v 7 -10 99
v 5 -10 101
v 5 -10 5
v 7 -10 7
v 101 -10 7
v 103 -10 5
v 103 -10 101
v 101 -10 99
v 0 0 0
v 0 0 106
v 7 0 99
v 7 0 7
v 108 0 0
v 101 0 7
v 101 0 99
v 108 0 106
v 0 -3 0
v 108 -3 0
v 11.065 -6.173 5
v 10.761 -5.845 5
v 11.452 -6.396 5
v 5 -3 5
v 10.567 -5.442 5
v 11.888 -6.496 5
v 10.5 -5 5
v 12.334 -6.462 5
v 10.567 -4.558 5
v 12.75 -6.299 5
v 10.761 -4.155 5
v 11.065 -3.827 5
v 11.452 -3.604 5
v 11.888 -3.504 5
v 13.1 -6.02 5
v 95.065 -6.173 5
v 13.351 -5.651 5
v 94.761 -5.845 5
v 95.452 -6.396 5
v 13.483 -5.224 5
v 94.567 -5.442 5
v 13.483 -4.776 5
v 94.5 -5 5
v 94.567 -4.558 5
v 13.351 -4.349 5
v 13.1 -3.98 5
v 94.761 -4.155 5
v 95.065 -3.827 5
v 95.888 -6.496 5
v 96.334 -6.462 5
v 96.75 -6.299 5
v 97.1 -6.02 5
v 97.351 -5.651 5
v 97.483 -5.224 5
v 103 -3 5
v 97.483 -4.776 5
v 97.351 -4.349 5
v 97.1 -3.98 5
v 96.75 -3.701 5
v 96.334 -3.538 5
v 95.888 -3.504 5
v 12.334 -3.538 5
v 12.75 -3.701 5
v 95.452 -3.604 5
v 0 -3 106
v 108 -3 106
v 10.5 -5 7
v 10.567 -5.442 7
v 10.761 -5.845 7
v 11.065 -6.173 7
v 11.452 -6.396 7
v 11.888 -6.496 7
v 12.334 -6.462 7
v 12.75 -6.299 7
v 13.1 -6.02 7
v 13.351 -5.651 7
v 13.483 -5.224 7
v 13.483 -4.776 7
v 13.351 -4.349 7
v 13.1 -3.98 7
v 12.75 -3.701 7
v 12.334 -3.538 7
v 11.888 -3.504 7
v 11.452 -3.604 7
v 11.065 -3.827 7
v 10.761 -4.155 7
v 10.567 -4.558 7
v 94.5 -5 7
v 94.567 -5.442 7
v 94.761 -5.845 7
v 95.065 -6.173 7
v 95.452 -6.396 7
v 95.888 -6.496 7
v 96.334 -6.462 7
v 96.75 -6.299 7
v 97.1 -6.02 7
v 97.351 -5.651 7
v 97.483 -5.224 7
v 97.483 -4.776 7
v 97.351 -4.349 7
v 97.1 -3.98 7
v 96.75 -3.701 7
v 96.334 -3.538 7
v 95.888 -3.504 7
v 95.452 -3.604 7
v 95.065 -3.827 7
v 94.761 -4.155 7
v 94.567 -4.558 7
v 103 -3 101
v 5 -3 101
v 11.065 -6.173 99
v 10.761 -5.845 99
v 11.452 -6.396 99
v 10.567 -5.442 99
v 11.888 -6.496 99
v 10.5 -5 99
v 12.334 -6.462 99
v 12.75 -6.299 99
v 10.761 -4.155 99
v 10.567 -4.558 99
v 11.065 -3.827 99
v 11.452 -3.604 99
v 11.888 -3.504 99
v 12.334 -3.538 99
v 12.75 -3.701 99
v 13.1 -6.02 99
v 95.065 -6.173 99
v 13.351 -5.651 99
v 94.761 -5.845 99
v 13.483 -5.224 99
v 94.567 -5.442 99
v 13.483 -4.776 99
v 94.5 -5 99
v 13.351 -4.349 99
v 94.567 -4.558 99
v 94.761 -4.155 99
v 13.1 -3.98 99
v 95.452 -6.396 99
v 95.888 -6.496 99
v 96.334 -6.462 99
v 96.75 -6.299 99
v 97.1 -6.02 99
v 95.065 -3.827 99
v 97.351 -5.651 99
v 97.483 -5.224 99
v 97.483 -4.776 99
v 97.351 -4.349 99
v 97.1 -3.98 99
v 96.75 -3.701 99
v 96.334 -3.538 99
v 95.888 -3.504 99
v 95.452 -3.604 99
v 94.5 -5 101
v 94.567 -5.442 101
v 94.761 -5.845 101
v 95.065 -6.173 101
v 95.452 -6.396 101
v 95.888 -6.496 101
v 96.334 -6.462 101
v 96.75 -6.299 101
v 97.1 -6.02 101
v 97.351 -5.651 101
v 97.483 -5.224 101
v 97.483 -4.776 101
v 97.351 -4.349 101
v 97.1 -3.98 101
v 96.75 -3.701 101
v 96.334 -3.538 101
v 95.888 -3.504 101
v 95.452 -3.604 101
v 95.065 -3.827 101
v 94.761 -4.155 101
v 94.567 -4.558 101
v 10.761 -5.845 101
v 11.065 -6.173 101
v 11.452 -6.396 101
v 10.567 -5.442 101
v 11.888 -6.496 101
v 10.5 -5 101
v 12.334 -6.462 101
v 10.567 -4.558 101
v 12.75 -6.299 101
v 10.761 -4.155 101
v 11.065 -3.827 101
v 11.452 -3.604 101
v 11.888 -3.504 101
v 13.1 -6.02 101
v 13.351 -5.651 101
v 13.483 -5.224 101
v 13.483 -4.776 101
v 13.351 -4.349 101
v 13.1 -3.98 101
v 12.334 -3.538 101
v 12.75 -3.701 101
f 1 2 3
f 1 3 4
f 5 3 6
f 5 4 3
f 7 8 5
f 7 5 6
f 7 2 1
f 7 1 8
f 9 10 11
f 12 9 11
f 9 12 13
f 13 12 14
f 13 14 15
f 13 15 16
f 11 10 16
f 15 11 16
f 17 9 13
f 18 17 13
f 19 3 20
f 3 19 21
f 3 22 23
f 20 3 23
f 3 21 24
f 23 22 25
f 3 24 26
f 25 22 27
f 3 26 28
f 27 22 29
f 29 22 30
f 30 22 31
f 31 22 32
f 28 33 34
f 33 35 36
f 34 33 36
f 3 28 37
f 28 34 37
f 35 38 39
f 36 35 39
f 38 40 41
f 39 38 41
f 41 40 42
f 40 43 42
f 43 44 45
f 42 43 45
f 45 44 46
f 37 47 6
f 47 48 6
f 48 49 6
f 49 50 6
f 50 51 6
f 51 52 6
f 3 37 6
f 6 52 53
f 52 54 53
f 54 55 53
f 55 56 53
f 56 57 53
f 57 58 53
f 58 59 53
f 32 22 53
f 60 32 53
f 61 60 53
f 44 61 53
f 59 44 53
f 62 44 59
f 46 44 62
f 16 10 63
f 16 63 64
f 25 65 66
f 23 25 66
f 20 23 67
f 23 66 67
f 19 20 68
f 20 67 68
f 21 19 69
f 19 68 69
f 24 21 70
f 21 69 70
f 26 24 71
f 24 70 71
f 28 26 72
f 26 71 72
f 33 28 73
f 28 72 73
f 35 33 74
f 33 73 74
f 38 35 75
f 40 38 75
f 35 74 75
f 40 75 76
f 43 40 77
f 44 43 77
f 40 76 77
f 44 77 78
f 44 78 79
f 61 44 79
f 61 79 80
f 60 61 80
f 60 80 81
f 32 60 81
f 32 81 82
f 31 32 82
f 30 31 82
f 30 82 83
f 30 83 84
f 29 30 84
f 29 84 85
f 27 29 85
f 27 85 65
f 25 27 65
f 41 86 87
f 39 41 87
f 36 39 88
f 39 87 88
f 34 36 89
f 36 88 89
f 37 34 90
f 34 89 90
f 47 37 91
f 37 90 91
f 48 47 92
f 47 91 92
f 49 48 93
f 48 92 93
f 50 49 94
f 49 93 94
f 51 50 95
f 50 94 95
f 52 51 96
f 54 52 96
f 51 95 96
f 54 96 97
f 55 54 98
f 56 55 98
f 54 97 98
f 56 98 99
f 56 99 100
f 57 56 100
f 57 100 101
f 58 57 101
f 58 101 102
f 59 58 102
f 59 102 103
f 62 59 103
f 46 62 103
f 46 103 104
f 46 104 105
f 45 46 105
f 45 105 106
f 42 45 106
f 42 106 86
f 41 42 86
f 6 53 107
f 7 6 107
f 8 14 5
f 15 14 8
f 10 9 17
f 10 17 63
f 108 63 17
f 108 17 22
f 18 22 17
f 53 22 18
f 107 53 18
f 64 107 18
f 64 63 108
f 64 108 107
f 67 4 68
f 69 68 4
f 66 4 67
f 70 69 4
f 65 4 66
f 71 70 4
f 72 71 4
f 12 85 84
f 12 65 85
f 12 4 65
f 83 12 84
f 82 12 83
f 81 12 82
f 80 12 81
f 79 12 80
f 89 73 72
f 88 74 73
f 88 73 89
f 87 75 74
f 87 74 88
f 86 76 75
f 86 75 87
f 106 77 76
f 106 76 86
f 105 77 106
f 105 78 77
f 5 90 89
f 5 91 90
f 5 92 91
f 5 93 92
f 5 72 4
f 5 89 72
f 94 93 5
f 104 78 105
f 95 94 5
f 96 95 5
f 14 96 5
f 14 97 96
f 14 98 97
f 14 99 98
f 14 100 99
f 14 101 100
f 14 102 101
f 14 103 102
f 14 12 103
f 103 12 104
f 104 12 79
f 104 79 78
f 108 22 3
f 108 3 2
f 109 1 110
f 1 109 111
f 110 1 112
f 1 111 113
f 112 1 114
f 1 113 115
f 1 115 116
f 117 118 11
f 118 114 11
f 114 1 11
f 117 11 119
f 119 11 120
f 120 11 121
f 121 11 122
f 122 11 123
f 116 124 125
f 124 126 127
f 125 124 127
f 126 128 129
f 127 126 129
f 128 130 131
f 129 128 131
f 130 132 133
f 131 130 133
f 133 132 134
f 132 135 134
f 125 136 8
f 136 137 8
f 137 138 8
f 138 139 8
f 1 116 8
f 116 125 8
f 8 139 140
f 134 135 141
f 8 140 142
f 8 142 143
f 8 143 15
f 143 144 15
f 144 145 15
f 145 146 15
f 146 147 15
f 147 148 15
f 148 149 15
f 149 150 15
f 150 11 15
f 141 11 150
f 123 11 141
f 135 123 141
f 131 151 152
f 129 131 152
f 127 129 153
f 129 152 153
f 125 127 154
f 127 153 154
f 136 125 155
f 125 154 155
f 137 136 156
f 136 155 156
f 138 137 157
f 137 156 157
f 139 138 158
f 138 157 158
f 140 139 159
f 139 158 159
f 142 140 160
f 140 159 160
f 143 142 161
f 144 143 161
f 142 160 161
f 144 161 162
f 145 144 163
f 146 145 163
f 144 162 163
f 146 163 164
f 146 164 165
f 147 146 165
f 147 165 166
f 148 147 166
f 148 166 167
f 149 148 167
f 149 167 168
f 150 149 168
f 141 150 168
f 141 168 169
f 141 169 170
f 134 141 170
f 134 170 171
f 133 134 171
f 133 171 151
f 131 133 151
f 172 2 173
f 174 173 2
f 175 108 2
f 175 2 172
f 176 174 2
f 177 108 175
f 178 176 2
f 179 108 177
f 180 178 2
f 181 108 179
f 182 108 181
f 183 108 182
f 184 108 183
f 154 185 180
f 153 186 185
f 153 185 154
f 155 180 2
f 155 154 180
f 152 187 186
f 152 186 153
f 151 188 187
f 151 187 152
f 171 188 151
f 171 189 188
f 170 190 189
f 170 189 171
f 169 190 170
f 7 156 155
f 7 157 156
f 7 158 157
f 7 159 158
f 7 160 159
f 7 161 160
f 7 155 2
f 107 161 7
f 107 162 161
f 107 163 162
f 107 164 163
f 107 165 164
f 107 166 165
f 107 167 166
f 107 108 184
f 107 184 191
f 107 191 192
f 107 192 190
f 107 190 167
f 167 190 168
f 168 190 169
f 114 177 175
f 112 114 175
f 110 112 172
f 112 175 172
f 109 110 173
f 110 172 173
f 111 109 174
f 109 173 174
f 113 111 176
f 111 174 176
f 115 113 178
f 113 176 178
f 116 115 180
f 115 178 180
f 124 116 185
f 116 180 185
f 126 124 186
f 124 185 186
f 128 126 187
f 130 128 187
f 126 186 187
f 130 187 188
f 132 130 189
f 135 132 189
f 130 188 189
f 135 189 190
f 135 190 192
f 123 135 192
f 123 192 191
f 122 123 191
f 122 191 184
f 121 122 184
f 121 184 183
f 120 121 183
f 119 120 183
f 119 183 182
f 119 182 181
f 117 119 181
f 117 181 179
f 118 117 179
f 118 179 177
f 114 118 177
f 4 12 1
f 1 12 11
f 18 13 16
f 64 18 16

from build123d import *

# Parameters (mm, degrees)
F0_W     = 98
F0_H     = 96
F0_W_2   = 94
F0_H_2   = 92
F1_DEPTH = 10
F0_W_3   = 108
F0_H_3   = 106
F2_DEPTH = 3
F4_D     = 3
F4_DEPTH = 110
F4_START = 5
F4_TIP   = 0.9012909285


with BuildPart() as f1:
    # F0 (on Front) → F1 (new body)
    with BuildSketch(Plane.XZ):
        with Locations((54, 53)):
            Rectangle(F0_W, F0_H)
        with Locations((54, 53)):
            Rectangle(F0_W_2, F0_H_2, mode=Mode.SUBTRACT)
    extrude(amount=F1_DEPTH)

    # F0 (on Front) → F2 (join)
    with BuildSketch(Plane.XZ):
        with Locations((54, 53)):
            Rectangle(F0_W_3, F0_H_3)
        with Locations((54, 53)):
            Rectangle(F0_W, F0_H, mode=Mode.SUBTRACT)
    extrude(amount=F2_DEPTH)

    # F4
    # its depths count from where the whole tool has entered the part; down to there all is cleared
    with Locations(Plane(origin=(0, 0, 0), x_dir=(1, 0, 0), z_dir=(0, 0, -1)).offset(-F4_START)):
        with Locations((12, 5), (96, 5)):
            Hole(F4_D / 2, depth=F4_DEPTH)
            with Locations((0, 0, -(F4_DEPTH + F4_TIP / 2))):  # 118° drill point
                Cone(0, F4_D / 2, F4_TIP, mode=Mode.SUBTRACT)


solid = f1.part
